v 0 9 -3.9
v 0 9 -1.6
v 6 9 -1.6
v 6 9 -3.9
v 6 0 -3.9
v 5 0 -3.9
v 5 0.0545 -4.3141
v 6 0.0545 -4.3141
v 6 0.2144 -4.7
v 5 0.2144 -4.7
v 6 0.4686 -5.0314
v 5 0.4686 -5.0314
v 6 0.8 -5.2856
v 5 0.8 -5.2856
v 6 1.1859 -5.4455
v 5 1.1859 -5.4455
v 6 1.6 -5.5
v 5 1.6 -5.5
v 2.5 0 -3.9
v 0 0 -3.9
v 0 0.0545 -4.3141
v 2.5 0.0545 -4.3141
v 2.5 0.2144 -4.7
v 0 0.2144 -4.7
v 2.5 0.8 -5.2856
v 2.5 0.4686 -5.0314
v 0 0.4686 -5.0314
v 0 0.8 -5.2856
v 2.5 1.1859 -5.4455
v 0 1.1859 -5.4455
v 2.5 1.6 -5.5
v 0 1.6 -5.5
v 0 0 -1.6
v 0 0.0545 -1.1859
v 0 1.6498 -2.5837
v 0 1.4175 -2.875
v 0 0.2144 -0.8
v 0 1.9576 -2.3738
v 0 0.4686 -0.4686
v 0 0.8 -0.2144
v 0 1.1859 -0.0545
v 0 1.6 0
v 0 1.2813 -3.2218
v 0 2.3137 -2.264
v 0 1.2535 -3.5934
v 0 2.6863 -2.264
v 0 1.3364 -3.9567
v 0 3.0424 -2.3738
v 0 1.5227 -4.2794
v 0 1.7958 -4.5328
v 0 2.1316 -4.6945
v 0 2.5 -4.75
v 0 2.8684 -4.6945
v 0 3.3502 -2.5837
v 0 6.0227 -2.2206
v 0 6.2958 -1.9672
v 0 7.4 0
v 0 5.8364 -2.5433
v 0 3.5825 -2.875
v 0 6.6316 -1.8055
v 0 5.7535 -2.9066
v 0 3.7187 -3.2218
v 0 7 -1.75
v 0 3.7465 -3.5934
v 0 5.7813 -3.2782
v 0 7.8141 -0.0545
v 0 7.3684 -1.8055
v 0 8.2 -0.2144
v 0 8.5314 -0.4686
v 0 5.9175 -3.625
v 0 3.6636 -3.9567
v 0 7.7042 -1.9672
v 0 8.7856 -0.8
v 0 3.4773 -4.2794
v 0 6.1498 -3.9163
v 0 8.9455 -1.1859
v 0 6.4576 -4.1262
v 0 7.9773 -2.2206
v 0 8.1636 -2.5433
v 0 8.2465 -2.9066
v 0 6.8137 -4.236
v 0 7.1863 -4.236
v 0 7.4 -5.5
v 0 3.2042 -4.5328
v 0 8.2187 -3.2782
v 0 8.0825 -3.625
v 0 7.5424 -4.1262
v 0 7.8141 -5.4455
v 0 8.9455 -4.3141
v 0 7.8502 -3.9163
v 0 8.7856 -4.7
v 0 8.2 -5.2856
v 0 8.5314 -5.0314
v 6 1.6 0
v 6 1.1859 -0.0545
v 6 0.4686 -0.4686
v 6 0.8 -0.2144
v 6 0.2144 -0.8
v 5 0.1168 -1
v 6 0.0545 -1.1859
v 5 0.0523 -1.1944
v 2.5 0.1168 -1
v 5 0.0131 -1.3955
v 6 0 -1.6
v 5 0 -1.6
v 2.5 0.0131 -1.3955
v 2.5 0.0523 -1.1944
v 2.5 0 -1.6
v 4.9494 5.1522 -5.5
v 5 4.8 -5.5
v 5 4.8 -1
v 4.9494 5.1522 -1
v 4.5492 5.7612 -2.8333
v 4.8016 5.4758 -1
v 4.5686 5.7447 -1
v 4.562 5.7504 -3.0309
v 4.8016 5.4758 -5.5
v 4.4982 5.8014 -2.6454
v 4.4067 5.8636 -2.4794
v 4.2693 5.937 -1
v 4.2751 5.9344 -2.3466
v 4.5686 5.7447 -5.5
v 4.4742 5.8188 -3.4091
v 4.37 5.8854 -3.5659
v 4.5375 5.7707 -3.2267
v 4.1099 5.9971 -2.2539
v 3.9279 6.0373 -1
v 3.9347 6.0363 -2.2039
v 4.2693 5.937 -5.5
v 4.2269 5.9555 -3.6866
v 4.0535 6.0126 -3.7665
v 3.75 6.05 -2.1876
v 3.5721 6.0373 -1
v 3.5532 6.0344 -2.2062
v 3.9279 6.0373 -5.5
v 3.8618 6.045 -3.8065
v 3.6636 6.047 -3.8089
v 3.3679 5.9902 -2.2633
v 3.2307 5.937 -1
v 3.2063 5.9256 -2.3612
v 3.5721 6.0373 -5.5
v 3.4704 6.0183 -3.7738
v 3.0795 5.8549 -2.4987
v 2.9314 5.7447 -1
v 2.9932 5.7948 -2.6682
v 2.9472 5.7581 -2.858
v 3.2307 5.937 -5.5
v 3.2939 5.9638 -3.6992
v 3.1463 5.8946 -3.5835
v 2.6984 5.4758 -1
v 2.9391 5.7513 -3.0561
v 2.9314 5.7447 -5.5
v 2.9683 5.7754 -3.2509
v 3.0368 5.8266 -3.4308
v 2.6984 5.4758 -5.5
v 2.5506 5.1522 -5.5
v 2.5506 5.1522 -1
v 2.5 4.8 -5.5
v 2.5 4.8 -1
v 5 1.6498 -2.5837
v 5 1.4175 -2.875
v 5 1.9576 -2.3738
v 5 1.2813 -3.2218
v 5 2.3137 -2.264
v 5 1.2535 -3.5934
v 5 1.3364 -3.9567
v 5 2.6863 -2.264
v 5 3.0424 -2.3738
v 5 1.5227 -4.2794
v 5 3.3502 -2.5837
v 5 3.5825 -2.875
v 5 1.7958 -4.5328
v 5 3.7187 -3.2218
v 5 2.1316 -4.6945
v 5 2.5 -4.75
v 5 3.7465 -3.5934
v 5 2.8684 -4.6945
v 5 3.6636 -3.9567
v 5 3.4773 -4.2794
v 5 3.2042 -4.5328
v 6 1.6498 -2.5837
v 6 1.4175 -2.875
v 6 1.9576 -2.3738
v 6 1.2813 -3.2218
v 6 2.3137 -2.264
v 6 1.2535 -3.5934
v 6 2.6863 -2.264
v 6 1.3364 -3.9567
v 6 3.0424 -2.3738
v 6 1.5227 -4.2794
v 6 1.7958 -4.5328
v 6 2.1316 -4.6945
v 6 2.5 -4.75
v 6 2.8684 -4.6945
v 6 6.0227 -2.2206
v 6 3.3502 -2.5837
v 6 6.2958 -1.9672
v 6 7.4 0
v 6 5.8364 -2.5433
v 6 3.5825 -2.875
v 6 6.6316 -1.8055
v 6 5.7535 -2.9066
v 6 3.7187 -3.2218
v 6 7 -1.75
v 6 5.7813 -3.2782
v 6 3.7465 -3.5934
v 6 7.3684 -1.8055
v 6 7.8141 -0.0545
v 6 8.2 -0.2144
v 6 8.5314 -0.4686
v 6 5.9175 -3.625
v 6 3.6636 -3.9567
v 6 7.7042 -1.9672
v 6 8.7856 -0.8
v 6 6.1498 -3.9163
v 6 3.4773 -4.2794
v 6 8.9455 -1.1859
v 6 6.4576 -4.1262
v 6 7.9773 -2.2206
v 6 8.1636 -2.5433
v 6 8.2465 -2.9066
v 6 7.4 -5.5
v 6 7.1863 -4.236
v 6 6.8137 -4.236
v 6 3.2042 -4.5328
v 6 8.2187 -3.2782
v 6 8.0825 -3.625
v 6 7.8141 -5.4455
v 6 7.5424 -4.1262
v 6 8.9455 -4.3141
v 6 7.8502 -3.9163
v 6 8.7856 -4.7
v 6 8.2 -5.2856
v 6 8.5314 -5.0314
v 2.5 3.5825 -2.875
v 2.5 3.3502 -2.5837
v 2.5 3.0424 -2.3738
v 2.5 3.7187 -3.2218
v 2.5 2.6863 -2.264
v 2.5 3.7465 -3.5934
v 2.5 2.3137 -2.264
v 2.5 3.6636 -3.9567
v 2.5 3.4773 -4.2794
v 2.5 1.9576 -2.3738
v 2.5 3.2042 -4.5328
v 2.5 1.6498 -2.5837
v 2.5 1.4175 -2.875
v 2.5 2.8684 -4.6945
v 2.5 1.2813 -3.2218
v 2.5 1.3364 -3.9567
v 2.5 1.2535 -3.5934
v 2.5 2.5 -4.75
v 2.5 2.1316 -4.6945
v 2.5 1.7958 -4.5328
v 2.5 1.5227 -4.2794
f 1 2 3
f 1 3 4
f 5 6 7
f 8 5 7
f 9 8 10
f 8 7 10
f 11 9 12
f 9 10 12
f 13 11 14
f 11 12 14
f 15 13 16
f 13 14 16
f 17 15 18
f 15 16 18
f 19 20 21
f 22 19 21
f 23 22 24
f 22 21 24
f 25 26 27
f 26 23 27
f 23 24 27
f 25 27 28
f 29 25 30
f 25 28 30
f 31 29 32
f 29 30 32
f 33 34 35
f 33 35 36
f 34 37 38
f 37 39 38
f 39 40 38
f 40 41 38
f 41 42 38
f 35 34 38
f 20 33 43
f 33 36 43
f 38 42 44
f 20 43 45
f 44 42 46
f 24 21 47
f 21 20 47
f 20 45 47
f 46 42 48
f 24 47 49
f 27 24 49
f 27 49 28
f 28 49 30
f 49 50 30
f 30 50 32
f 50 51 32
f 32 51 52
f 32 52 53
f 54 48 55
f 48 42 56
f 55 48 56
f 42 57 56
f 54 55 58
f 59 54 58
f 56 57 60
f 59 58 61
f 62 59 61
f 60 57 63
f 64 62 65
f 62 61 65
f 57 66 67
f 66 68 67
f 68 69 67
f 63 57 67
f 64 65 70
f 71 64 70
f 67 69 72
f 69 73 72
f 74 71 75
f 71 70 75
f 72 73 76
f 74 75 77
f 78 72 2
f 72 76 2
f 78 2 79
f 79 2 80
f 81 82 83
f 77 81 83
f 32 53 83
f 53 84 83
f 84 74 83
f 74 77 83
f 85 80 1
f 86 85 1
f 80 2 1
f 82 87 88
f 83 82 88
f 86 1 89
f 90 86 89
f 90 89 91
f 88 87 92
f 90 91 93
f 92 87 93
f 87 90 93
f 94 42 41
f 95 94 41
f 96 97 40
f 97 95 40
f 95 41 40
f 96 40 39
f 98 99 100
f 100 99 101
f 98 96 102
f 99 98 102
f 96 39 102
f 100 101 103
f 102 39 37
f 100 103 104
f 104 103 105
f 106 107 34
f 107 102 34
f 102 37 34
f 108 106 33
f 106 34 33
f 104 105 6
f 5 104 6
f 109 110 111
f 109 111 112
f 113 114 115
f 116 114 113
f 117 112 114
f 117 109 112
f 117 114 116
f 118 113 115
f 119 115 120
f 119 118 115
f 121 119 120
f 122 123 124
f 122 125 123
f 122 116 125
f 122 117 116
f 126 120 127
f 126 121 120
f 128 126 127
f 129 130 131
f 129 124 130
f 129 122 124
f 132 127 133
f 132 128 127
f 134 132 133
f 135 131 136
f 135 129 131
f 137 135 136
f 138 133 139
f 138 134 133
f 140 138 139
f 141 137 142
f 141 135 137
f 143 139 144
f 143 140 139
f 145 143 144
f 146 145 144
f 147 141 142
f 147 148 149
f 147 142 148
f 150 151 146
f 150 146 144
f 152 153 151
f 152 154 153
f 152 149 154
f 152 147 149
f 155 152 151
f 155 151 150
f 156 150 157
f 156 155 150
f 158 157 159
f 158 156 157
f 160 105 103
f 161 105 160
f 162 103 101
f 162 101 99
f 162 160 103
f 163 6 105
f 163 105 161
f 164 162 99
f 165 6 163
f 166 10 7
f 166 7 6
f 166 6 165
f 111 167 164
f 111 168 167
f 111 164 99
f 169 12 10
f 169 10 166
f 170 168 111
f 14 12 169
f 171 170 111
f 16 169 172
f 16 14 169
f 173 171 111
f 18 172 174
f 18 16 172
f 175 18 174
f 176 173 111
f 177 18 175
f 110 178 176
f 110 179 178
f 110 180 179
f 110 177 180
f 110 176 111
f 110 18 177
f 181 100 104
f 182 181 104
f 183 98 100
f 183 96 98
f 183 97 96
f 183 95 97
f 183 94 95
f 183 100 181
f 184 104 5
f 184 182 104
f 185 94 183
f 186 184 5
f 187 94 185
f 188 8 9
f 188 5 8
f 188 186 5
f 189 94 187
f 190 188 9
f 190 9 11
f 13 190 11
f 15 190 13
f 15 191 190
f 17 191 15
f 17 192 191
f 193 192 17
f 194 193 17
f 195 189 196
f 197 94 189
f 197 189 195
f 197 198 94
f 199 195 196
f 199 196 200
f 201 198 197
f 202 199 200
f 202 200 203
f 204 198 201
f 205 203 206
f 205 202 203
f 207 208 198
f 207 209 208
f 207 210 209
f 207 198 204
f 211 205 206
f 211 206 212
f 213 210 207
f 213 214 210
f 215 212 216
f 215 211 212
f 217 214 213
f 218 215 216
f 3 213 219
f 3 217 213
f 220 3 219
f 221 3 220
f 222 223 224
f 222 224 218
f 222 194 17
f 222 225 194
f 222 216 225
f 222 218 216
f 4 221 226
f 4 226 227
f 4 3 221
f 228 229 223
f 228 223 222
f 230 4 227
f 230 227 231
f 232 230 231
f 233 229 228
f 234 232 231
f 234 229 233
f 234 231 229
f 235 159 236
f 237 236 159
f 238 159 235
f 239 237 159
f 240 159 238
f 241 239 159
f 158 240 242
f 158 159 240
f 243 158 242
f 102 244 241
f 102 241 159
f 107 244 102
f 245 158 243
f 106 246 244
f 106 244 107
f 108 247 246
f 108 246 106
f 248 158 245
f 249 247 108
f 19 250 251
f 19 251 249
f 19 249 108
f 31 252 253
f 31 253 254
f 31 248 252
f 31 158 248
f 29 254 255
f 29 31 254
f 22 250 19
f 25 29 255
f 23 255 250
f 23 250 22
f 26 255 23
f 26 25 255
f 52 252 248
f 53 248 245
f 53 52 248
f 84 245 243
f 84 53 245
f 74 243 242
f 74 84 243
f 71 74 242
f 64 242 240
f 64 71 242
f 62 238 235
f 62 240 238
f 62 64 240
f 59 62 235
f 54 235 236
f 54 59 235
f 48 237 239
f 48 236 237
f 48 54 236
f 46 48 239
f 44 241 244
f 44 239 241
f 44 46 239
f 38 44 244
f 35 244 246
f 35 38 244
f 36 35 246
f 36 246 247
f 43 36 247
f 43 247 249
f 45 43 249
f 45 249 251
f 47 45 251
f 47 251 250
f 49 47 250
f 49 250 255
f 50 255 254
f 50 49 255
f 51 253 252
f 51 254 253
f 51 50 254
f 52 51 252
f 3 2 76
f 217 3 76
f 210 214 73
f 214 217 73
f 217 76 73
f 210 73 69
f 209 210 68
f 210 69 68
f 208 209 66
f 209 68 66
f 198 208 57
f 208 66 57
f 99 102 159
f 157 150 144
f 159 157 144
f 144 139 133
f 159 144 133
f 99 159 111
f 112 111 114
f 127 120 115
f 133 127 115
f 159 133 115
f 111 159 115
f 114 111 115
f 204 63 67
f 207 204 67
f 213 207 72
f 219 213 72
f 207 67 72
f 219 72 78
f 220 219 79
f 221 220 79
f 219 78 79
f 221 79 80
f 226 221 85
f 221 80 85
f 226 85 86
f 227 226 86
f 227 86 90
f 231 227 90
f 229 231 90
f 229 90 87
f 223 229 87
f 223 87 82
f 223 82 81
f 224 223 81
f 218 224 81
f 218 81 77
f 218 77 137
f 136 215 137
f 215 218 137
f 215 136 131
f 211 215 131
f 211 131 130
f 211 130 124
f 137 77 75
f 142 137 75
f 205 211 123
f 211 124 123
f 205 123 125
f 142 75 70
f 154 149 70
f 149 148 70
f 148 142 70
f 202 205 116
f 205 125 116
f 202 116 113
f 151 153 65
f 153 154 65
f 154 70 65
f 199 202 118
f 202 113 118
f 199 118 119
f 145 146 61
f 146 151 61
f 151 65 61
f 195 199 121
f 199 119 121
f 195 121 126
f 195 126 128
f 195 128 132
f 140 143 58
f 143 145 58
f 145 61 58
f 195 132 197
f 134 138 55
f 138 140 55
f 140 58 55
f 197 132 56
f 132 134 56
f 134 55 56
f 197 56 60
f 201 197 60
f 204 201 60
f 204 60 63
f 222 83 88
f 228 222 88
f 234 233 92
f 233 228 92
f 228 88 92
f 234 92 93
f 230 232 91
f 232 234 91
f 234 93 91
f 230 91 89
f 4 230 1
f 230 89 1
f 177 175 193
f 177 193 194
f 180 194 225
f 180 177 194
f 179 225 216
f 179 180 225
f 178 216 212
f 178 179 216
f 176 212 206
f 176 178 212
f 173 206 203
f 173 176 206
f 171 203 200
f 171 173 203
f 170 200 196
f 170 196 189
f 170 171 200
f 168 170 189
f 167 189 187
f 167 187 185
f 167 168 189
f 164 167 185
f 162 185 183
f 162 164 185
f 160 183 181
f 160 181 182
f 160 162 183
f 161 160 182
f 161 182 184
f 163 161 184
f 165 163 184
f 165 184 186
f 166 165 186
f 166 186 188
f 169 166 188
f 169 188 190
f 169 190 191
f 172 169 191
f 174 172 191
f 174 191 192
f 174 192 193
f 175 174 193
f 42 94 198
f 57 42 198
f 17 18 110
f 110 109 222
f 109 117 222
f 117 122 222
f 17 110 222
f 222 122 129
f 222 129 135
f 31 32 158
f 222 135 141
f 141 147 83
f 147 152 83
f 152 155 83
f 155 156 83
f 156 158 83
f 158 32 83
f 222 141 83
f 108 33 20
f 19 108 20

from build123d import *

# Parameters (mm, degrees)
SKETCH1_W           = 5.5
SKETCH1_H           = 9
SKETCH1_R           = 1.25
BOSS_EXTRUDE1_DEPTH = 6
CUT_EXTRUDE3_DEPTH  = 4.5
CUT_EXTRUDE4_REACH  = 14.135
SKETCH5_R           = 1.25
FILLET1_R           = 1.6


with BuildPart() as part:
    # Sketch1 → Boss-Extrude1 (new body)
    with BuildSketch(Plane(origin=(0, 0, 0), x_dir=(0, 0, -1), z_dir=(1, 0, 0))):
        with Locations((2.75, 4.5)):
            Rectangle(SKETCH1_W, SKETCH1_H)
        with Locations((3.5, 2.5)):
            Circle(SKETCH1_R, mode=Mode.SUBTRACT)
    extrude(amount=BOSS_EXTRUDE1_DEPTH)

    # Sketch4 → Cut-Extrude3 (cut)
    with BuildSketch(Plane(origin=(0, 0, -5.5), x_dir=(-1, 0, 0), z_dir=(0, 0, -1))):
        with BuildLine():
            Line((-5, 0), (-5, 4.8))
            ThreePointArc((-5, 4.8), (-3.75, 6.05), (-2.5, 4.8))
            Line((-2.5, 4.8), (-2.5, 0))
            ThreePointArc((-2.5, 0), (-3.75, -1.25), (-5, 0))
        make_face()
    extrude(amount=-CUT_EXTRUDE3_DEPTH, mode=Mode.SUBTRACT)

    # Sketch5 → Cut-Extrude4 (cut, up to next)
    with BuildSketch(Plane.ZY, mode=Mode.PRIVATE) as cut_extrude4_sk1:
        with Locations((-3, 7)):
            Circle(SKETCH5_R)
    cut_extrude4_tool1 = extrude(cut_extrude4_sk1.sketch, amount=-CUT_EXTRUDE4_REACH, mode=Mode.PRIVATE) & part.part
    add(cut_extrude4_tool1.solids().sort_by_distance((0, 7, -3))[0], mode=Mode.SUBTRACT)

    # Fillet1
    # the kernel refuses this fillet: 1.6 mm, written as the material it takes off along each edge
    with BuildSketch(Plane(origin=(-4, 0, 0), x_dir=(0, 0, -1), z_dir=(1, 0, 0)), Plane(origin=(-4, 9, 0), x_dir=(0, -1, 0), z_dir=(1, 0, 0))) as fillet1_piece_1:
        with BuildLine():
            CenterArc((FILLET1_R, FILLET1_R), FILLET1_R, 180, 90)
            Line((0, FILLET1_R), (0, 0))
            Line((0, 0), (FILLET1_R, 0))
        make_face()
    extrude(amount=14, mode=Mode.SUBTRACT)
    with BuildSketch(Plane(origin=(1, 0, -5.5), x_dir=(0, 0, 1), z_dir=(1, 0, 0))) as fillet1_piece_2:
        with BuildLine():
            CenterArc((FILLET1_R, -FILLET1_R), FILLET1_R, 90, 90)
            Line((0, -FILLET1_R), (0, 0))
            Line((0, 0), (FILLET1_R, 0))
        make_face()
    extrude(amount=9, mode=Mode.SUBTRACT)
    with BuildSketch(Plane(origin=(-4, 0, -5.5), x_dir=(0, 0, 1), z_dir=(1, 0, 0))) as fillet1_piece_3:
        with BuildLine():
            CenterArc((FILLET1_R, -FILLET1_R), FILLET1_R, 90, 90)
            Line((0, -FILLET1_R), (0, 0))
            Line((0, 0), (FILLET1_R, 0))
        make_face()
    extrude(amount=10.5, mode=Mode.SUBTRACT)
    with BuildSketch(Plane(origin=(-4, 9, -5.5), x_dir=(0, -1, 0), z_dir=(1, 0, 0))) as fillet1_piece_4:
        with BuildLine():
            CenterArc((FILLET1_R, -FILLET1_R), FILLET1_R, 90, 90)
            Line((0, -FILLET1_R), (0, 0))
            Line((0, 0), (FILLET1_R, 0))
        make_face()
    extrude(amount=14, mode=Mode.SUBTRACT)


solid = part.part
